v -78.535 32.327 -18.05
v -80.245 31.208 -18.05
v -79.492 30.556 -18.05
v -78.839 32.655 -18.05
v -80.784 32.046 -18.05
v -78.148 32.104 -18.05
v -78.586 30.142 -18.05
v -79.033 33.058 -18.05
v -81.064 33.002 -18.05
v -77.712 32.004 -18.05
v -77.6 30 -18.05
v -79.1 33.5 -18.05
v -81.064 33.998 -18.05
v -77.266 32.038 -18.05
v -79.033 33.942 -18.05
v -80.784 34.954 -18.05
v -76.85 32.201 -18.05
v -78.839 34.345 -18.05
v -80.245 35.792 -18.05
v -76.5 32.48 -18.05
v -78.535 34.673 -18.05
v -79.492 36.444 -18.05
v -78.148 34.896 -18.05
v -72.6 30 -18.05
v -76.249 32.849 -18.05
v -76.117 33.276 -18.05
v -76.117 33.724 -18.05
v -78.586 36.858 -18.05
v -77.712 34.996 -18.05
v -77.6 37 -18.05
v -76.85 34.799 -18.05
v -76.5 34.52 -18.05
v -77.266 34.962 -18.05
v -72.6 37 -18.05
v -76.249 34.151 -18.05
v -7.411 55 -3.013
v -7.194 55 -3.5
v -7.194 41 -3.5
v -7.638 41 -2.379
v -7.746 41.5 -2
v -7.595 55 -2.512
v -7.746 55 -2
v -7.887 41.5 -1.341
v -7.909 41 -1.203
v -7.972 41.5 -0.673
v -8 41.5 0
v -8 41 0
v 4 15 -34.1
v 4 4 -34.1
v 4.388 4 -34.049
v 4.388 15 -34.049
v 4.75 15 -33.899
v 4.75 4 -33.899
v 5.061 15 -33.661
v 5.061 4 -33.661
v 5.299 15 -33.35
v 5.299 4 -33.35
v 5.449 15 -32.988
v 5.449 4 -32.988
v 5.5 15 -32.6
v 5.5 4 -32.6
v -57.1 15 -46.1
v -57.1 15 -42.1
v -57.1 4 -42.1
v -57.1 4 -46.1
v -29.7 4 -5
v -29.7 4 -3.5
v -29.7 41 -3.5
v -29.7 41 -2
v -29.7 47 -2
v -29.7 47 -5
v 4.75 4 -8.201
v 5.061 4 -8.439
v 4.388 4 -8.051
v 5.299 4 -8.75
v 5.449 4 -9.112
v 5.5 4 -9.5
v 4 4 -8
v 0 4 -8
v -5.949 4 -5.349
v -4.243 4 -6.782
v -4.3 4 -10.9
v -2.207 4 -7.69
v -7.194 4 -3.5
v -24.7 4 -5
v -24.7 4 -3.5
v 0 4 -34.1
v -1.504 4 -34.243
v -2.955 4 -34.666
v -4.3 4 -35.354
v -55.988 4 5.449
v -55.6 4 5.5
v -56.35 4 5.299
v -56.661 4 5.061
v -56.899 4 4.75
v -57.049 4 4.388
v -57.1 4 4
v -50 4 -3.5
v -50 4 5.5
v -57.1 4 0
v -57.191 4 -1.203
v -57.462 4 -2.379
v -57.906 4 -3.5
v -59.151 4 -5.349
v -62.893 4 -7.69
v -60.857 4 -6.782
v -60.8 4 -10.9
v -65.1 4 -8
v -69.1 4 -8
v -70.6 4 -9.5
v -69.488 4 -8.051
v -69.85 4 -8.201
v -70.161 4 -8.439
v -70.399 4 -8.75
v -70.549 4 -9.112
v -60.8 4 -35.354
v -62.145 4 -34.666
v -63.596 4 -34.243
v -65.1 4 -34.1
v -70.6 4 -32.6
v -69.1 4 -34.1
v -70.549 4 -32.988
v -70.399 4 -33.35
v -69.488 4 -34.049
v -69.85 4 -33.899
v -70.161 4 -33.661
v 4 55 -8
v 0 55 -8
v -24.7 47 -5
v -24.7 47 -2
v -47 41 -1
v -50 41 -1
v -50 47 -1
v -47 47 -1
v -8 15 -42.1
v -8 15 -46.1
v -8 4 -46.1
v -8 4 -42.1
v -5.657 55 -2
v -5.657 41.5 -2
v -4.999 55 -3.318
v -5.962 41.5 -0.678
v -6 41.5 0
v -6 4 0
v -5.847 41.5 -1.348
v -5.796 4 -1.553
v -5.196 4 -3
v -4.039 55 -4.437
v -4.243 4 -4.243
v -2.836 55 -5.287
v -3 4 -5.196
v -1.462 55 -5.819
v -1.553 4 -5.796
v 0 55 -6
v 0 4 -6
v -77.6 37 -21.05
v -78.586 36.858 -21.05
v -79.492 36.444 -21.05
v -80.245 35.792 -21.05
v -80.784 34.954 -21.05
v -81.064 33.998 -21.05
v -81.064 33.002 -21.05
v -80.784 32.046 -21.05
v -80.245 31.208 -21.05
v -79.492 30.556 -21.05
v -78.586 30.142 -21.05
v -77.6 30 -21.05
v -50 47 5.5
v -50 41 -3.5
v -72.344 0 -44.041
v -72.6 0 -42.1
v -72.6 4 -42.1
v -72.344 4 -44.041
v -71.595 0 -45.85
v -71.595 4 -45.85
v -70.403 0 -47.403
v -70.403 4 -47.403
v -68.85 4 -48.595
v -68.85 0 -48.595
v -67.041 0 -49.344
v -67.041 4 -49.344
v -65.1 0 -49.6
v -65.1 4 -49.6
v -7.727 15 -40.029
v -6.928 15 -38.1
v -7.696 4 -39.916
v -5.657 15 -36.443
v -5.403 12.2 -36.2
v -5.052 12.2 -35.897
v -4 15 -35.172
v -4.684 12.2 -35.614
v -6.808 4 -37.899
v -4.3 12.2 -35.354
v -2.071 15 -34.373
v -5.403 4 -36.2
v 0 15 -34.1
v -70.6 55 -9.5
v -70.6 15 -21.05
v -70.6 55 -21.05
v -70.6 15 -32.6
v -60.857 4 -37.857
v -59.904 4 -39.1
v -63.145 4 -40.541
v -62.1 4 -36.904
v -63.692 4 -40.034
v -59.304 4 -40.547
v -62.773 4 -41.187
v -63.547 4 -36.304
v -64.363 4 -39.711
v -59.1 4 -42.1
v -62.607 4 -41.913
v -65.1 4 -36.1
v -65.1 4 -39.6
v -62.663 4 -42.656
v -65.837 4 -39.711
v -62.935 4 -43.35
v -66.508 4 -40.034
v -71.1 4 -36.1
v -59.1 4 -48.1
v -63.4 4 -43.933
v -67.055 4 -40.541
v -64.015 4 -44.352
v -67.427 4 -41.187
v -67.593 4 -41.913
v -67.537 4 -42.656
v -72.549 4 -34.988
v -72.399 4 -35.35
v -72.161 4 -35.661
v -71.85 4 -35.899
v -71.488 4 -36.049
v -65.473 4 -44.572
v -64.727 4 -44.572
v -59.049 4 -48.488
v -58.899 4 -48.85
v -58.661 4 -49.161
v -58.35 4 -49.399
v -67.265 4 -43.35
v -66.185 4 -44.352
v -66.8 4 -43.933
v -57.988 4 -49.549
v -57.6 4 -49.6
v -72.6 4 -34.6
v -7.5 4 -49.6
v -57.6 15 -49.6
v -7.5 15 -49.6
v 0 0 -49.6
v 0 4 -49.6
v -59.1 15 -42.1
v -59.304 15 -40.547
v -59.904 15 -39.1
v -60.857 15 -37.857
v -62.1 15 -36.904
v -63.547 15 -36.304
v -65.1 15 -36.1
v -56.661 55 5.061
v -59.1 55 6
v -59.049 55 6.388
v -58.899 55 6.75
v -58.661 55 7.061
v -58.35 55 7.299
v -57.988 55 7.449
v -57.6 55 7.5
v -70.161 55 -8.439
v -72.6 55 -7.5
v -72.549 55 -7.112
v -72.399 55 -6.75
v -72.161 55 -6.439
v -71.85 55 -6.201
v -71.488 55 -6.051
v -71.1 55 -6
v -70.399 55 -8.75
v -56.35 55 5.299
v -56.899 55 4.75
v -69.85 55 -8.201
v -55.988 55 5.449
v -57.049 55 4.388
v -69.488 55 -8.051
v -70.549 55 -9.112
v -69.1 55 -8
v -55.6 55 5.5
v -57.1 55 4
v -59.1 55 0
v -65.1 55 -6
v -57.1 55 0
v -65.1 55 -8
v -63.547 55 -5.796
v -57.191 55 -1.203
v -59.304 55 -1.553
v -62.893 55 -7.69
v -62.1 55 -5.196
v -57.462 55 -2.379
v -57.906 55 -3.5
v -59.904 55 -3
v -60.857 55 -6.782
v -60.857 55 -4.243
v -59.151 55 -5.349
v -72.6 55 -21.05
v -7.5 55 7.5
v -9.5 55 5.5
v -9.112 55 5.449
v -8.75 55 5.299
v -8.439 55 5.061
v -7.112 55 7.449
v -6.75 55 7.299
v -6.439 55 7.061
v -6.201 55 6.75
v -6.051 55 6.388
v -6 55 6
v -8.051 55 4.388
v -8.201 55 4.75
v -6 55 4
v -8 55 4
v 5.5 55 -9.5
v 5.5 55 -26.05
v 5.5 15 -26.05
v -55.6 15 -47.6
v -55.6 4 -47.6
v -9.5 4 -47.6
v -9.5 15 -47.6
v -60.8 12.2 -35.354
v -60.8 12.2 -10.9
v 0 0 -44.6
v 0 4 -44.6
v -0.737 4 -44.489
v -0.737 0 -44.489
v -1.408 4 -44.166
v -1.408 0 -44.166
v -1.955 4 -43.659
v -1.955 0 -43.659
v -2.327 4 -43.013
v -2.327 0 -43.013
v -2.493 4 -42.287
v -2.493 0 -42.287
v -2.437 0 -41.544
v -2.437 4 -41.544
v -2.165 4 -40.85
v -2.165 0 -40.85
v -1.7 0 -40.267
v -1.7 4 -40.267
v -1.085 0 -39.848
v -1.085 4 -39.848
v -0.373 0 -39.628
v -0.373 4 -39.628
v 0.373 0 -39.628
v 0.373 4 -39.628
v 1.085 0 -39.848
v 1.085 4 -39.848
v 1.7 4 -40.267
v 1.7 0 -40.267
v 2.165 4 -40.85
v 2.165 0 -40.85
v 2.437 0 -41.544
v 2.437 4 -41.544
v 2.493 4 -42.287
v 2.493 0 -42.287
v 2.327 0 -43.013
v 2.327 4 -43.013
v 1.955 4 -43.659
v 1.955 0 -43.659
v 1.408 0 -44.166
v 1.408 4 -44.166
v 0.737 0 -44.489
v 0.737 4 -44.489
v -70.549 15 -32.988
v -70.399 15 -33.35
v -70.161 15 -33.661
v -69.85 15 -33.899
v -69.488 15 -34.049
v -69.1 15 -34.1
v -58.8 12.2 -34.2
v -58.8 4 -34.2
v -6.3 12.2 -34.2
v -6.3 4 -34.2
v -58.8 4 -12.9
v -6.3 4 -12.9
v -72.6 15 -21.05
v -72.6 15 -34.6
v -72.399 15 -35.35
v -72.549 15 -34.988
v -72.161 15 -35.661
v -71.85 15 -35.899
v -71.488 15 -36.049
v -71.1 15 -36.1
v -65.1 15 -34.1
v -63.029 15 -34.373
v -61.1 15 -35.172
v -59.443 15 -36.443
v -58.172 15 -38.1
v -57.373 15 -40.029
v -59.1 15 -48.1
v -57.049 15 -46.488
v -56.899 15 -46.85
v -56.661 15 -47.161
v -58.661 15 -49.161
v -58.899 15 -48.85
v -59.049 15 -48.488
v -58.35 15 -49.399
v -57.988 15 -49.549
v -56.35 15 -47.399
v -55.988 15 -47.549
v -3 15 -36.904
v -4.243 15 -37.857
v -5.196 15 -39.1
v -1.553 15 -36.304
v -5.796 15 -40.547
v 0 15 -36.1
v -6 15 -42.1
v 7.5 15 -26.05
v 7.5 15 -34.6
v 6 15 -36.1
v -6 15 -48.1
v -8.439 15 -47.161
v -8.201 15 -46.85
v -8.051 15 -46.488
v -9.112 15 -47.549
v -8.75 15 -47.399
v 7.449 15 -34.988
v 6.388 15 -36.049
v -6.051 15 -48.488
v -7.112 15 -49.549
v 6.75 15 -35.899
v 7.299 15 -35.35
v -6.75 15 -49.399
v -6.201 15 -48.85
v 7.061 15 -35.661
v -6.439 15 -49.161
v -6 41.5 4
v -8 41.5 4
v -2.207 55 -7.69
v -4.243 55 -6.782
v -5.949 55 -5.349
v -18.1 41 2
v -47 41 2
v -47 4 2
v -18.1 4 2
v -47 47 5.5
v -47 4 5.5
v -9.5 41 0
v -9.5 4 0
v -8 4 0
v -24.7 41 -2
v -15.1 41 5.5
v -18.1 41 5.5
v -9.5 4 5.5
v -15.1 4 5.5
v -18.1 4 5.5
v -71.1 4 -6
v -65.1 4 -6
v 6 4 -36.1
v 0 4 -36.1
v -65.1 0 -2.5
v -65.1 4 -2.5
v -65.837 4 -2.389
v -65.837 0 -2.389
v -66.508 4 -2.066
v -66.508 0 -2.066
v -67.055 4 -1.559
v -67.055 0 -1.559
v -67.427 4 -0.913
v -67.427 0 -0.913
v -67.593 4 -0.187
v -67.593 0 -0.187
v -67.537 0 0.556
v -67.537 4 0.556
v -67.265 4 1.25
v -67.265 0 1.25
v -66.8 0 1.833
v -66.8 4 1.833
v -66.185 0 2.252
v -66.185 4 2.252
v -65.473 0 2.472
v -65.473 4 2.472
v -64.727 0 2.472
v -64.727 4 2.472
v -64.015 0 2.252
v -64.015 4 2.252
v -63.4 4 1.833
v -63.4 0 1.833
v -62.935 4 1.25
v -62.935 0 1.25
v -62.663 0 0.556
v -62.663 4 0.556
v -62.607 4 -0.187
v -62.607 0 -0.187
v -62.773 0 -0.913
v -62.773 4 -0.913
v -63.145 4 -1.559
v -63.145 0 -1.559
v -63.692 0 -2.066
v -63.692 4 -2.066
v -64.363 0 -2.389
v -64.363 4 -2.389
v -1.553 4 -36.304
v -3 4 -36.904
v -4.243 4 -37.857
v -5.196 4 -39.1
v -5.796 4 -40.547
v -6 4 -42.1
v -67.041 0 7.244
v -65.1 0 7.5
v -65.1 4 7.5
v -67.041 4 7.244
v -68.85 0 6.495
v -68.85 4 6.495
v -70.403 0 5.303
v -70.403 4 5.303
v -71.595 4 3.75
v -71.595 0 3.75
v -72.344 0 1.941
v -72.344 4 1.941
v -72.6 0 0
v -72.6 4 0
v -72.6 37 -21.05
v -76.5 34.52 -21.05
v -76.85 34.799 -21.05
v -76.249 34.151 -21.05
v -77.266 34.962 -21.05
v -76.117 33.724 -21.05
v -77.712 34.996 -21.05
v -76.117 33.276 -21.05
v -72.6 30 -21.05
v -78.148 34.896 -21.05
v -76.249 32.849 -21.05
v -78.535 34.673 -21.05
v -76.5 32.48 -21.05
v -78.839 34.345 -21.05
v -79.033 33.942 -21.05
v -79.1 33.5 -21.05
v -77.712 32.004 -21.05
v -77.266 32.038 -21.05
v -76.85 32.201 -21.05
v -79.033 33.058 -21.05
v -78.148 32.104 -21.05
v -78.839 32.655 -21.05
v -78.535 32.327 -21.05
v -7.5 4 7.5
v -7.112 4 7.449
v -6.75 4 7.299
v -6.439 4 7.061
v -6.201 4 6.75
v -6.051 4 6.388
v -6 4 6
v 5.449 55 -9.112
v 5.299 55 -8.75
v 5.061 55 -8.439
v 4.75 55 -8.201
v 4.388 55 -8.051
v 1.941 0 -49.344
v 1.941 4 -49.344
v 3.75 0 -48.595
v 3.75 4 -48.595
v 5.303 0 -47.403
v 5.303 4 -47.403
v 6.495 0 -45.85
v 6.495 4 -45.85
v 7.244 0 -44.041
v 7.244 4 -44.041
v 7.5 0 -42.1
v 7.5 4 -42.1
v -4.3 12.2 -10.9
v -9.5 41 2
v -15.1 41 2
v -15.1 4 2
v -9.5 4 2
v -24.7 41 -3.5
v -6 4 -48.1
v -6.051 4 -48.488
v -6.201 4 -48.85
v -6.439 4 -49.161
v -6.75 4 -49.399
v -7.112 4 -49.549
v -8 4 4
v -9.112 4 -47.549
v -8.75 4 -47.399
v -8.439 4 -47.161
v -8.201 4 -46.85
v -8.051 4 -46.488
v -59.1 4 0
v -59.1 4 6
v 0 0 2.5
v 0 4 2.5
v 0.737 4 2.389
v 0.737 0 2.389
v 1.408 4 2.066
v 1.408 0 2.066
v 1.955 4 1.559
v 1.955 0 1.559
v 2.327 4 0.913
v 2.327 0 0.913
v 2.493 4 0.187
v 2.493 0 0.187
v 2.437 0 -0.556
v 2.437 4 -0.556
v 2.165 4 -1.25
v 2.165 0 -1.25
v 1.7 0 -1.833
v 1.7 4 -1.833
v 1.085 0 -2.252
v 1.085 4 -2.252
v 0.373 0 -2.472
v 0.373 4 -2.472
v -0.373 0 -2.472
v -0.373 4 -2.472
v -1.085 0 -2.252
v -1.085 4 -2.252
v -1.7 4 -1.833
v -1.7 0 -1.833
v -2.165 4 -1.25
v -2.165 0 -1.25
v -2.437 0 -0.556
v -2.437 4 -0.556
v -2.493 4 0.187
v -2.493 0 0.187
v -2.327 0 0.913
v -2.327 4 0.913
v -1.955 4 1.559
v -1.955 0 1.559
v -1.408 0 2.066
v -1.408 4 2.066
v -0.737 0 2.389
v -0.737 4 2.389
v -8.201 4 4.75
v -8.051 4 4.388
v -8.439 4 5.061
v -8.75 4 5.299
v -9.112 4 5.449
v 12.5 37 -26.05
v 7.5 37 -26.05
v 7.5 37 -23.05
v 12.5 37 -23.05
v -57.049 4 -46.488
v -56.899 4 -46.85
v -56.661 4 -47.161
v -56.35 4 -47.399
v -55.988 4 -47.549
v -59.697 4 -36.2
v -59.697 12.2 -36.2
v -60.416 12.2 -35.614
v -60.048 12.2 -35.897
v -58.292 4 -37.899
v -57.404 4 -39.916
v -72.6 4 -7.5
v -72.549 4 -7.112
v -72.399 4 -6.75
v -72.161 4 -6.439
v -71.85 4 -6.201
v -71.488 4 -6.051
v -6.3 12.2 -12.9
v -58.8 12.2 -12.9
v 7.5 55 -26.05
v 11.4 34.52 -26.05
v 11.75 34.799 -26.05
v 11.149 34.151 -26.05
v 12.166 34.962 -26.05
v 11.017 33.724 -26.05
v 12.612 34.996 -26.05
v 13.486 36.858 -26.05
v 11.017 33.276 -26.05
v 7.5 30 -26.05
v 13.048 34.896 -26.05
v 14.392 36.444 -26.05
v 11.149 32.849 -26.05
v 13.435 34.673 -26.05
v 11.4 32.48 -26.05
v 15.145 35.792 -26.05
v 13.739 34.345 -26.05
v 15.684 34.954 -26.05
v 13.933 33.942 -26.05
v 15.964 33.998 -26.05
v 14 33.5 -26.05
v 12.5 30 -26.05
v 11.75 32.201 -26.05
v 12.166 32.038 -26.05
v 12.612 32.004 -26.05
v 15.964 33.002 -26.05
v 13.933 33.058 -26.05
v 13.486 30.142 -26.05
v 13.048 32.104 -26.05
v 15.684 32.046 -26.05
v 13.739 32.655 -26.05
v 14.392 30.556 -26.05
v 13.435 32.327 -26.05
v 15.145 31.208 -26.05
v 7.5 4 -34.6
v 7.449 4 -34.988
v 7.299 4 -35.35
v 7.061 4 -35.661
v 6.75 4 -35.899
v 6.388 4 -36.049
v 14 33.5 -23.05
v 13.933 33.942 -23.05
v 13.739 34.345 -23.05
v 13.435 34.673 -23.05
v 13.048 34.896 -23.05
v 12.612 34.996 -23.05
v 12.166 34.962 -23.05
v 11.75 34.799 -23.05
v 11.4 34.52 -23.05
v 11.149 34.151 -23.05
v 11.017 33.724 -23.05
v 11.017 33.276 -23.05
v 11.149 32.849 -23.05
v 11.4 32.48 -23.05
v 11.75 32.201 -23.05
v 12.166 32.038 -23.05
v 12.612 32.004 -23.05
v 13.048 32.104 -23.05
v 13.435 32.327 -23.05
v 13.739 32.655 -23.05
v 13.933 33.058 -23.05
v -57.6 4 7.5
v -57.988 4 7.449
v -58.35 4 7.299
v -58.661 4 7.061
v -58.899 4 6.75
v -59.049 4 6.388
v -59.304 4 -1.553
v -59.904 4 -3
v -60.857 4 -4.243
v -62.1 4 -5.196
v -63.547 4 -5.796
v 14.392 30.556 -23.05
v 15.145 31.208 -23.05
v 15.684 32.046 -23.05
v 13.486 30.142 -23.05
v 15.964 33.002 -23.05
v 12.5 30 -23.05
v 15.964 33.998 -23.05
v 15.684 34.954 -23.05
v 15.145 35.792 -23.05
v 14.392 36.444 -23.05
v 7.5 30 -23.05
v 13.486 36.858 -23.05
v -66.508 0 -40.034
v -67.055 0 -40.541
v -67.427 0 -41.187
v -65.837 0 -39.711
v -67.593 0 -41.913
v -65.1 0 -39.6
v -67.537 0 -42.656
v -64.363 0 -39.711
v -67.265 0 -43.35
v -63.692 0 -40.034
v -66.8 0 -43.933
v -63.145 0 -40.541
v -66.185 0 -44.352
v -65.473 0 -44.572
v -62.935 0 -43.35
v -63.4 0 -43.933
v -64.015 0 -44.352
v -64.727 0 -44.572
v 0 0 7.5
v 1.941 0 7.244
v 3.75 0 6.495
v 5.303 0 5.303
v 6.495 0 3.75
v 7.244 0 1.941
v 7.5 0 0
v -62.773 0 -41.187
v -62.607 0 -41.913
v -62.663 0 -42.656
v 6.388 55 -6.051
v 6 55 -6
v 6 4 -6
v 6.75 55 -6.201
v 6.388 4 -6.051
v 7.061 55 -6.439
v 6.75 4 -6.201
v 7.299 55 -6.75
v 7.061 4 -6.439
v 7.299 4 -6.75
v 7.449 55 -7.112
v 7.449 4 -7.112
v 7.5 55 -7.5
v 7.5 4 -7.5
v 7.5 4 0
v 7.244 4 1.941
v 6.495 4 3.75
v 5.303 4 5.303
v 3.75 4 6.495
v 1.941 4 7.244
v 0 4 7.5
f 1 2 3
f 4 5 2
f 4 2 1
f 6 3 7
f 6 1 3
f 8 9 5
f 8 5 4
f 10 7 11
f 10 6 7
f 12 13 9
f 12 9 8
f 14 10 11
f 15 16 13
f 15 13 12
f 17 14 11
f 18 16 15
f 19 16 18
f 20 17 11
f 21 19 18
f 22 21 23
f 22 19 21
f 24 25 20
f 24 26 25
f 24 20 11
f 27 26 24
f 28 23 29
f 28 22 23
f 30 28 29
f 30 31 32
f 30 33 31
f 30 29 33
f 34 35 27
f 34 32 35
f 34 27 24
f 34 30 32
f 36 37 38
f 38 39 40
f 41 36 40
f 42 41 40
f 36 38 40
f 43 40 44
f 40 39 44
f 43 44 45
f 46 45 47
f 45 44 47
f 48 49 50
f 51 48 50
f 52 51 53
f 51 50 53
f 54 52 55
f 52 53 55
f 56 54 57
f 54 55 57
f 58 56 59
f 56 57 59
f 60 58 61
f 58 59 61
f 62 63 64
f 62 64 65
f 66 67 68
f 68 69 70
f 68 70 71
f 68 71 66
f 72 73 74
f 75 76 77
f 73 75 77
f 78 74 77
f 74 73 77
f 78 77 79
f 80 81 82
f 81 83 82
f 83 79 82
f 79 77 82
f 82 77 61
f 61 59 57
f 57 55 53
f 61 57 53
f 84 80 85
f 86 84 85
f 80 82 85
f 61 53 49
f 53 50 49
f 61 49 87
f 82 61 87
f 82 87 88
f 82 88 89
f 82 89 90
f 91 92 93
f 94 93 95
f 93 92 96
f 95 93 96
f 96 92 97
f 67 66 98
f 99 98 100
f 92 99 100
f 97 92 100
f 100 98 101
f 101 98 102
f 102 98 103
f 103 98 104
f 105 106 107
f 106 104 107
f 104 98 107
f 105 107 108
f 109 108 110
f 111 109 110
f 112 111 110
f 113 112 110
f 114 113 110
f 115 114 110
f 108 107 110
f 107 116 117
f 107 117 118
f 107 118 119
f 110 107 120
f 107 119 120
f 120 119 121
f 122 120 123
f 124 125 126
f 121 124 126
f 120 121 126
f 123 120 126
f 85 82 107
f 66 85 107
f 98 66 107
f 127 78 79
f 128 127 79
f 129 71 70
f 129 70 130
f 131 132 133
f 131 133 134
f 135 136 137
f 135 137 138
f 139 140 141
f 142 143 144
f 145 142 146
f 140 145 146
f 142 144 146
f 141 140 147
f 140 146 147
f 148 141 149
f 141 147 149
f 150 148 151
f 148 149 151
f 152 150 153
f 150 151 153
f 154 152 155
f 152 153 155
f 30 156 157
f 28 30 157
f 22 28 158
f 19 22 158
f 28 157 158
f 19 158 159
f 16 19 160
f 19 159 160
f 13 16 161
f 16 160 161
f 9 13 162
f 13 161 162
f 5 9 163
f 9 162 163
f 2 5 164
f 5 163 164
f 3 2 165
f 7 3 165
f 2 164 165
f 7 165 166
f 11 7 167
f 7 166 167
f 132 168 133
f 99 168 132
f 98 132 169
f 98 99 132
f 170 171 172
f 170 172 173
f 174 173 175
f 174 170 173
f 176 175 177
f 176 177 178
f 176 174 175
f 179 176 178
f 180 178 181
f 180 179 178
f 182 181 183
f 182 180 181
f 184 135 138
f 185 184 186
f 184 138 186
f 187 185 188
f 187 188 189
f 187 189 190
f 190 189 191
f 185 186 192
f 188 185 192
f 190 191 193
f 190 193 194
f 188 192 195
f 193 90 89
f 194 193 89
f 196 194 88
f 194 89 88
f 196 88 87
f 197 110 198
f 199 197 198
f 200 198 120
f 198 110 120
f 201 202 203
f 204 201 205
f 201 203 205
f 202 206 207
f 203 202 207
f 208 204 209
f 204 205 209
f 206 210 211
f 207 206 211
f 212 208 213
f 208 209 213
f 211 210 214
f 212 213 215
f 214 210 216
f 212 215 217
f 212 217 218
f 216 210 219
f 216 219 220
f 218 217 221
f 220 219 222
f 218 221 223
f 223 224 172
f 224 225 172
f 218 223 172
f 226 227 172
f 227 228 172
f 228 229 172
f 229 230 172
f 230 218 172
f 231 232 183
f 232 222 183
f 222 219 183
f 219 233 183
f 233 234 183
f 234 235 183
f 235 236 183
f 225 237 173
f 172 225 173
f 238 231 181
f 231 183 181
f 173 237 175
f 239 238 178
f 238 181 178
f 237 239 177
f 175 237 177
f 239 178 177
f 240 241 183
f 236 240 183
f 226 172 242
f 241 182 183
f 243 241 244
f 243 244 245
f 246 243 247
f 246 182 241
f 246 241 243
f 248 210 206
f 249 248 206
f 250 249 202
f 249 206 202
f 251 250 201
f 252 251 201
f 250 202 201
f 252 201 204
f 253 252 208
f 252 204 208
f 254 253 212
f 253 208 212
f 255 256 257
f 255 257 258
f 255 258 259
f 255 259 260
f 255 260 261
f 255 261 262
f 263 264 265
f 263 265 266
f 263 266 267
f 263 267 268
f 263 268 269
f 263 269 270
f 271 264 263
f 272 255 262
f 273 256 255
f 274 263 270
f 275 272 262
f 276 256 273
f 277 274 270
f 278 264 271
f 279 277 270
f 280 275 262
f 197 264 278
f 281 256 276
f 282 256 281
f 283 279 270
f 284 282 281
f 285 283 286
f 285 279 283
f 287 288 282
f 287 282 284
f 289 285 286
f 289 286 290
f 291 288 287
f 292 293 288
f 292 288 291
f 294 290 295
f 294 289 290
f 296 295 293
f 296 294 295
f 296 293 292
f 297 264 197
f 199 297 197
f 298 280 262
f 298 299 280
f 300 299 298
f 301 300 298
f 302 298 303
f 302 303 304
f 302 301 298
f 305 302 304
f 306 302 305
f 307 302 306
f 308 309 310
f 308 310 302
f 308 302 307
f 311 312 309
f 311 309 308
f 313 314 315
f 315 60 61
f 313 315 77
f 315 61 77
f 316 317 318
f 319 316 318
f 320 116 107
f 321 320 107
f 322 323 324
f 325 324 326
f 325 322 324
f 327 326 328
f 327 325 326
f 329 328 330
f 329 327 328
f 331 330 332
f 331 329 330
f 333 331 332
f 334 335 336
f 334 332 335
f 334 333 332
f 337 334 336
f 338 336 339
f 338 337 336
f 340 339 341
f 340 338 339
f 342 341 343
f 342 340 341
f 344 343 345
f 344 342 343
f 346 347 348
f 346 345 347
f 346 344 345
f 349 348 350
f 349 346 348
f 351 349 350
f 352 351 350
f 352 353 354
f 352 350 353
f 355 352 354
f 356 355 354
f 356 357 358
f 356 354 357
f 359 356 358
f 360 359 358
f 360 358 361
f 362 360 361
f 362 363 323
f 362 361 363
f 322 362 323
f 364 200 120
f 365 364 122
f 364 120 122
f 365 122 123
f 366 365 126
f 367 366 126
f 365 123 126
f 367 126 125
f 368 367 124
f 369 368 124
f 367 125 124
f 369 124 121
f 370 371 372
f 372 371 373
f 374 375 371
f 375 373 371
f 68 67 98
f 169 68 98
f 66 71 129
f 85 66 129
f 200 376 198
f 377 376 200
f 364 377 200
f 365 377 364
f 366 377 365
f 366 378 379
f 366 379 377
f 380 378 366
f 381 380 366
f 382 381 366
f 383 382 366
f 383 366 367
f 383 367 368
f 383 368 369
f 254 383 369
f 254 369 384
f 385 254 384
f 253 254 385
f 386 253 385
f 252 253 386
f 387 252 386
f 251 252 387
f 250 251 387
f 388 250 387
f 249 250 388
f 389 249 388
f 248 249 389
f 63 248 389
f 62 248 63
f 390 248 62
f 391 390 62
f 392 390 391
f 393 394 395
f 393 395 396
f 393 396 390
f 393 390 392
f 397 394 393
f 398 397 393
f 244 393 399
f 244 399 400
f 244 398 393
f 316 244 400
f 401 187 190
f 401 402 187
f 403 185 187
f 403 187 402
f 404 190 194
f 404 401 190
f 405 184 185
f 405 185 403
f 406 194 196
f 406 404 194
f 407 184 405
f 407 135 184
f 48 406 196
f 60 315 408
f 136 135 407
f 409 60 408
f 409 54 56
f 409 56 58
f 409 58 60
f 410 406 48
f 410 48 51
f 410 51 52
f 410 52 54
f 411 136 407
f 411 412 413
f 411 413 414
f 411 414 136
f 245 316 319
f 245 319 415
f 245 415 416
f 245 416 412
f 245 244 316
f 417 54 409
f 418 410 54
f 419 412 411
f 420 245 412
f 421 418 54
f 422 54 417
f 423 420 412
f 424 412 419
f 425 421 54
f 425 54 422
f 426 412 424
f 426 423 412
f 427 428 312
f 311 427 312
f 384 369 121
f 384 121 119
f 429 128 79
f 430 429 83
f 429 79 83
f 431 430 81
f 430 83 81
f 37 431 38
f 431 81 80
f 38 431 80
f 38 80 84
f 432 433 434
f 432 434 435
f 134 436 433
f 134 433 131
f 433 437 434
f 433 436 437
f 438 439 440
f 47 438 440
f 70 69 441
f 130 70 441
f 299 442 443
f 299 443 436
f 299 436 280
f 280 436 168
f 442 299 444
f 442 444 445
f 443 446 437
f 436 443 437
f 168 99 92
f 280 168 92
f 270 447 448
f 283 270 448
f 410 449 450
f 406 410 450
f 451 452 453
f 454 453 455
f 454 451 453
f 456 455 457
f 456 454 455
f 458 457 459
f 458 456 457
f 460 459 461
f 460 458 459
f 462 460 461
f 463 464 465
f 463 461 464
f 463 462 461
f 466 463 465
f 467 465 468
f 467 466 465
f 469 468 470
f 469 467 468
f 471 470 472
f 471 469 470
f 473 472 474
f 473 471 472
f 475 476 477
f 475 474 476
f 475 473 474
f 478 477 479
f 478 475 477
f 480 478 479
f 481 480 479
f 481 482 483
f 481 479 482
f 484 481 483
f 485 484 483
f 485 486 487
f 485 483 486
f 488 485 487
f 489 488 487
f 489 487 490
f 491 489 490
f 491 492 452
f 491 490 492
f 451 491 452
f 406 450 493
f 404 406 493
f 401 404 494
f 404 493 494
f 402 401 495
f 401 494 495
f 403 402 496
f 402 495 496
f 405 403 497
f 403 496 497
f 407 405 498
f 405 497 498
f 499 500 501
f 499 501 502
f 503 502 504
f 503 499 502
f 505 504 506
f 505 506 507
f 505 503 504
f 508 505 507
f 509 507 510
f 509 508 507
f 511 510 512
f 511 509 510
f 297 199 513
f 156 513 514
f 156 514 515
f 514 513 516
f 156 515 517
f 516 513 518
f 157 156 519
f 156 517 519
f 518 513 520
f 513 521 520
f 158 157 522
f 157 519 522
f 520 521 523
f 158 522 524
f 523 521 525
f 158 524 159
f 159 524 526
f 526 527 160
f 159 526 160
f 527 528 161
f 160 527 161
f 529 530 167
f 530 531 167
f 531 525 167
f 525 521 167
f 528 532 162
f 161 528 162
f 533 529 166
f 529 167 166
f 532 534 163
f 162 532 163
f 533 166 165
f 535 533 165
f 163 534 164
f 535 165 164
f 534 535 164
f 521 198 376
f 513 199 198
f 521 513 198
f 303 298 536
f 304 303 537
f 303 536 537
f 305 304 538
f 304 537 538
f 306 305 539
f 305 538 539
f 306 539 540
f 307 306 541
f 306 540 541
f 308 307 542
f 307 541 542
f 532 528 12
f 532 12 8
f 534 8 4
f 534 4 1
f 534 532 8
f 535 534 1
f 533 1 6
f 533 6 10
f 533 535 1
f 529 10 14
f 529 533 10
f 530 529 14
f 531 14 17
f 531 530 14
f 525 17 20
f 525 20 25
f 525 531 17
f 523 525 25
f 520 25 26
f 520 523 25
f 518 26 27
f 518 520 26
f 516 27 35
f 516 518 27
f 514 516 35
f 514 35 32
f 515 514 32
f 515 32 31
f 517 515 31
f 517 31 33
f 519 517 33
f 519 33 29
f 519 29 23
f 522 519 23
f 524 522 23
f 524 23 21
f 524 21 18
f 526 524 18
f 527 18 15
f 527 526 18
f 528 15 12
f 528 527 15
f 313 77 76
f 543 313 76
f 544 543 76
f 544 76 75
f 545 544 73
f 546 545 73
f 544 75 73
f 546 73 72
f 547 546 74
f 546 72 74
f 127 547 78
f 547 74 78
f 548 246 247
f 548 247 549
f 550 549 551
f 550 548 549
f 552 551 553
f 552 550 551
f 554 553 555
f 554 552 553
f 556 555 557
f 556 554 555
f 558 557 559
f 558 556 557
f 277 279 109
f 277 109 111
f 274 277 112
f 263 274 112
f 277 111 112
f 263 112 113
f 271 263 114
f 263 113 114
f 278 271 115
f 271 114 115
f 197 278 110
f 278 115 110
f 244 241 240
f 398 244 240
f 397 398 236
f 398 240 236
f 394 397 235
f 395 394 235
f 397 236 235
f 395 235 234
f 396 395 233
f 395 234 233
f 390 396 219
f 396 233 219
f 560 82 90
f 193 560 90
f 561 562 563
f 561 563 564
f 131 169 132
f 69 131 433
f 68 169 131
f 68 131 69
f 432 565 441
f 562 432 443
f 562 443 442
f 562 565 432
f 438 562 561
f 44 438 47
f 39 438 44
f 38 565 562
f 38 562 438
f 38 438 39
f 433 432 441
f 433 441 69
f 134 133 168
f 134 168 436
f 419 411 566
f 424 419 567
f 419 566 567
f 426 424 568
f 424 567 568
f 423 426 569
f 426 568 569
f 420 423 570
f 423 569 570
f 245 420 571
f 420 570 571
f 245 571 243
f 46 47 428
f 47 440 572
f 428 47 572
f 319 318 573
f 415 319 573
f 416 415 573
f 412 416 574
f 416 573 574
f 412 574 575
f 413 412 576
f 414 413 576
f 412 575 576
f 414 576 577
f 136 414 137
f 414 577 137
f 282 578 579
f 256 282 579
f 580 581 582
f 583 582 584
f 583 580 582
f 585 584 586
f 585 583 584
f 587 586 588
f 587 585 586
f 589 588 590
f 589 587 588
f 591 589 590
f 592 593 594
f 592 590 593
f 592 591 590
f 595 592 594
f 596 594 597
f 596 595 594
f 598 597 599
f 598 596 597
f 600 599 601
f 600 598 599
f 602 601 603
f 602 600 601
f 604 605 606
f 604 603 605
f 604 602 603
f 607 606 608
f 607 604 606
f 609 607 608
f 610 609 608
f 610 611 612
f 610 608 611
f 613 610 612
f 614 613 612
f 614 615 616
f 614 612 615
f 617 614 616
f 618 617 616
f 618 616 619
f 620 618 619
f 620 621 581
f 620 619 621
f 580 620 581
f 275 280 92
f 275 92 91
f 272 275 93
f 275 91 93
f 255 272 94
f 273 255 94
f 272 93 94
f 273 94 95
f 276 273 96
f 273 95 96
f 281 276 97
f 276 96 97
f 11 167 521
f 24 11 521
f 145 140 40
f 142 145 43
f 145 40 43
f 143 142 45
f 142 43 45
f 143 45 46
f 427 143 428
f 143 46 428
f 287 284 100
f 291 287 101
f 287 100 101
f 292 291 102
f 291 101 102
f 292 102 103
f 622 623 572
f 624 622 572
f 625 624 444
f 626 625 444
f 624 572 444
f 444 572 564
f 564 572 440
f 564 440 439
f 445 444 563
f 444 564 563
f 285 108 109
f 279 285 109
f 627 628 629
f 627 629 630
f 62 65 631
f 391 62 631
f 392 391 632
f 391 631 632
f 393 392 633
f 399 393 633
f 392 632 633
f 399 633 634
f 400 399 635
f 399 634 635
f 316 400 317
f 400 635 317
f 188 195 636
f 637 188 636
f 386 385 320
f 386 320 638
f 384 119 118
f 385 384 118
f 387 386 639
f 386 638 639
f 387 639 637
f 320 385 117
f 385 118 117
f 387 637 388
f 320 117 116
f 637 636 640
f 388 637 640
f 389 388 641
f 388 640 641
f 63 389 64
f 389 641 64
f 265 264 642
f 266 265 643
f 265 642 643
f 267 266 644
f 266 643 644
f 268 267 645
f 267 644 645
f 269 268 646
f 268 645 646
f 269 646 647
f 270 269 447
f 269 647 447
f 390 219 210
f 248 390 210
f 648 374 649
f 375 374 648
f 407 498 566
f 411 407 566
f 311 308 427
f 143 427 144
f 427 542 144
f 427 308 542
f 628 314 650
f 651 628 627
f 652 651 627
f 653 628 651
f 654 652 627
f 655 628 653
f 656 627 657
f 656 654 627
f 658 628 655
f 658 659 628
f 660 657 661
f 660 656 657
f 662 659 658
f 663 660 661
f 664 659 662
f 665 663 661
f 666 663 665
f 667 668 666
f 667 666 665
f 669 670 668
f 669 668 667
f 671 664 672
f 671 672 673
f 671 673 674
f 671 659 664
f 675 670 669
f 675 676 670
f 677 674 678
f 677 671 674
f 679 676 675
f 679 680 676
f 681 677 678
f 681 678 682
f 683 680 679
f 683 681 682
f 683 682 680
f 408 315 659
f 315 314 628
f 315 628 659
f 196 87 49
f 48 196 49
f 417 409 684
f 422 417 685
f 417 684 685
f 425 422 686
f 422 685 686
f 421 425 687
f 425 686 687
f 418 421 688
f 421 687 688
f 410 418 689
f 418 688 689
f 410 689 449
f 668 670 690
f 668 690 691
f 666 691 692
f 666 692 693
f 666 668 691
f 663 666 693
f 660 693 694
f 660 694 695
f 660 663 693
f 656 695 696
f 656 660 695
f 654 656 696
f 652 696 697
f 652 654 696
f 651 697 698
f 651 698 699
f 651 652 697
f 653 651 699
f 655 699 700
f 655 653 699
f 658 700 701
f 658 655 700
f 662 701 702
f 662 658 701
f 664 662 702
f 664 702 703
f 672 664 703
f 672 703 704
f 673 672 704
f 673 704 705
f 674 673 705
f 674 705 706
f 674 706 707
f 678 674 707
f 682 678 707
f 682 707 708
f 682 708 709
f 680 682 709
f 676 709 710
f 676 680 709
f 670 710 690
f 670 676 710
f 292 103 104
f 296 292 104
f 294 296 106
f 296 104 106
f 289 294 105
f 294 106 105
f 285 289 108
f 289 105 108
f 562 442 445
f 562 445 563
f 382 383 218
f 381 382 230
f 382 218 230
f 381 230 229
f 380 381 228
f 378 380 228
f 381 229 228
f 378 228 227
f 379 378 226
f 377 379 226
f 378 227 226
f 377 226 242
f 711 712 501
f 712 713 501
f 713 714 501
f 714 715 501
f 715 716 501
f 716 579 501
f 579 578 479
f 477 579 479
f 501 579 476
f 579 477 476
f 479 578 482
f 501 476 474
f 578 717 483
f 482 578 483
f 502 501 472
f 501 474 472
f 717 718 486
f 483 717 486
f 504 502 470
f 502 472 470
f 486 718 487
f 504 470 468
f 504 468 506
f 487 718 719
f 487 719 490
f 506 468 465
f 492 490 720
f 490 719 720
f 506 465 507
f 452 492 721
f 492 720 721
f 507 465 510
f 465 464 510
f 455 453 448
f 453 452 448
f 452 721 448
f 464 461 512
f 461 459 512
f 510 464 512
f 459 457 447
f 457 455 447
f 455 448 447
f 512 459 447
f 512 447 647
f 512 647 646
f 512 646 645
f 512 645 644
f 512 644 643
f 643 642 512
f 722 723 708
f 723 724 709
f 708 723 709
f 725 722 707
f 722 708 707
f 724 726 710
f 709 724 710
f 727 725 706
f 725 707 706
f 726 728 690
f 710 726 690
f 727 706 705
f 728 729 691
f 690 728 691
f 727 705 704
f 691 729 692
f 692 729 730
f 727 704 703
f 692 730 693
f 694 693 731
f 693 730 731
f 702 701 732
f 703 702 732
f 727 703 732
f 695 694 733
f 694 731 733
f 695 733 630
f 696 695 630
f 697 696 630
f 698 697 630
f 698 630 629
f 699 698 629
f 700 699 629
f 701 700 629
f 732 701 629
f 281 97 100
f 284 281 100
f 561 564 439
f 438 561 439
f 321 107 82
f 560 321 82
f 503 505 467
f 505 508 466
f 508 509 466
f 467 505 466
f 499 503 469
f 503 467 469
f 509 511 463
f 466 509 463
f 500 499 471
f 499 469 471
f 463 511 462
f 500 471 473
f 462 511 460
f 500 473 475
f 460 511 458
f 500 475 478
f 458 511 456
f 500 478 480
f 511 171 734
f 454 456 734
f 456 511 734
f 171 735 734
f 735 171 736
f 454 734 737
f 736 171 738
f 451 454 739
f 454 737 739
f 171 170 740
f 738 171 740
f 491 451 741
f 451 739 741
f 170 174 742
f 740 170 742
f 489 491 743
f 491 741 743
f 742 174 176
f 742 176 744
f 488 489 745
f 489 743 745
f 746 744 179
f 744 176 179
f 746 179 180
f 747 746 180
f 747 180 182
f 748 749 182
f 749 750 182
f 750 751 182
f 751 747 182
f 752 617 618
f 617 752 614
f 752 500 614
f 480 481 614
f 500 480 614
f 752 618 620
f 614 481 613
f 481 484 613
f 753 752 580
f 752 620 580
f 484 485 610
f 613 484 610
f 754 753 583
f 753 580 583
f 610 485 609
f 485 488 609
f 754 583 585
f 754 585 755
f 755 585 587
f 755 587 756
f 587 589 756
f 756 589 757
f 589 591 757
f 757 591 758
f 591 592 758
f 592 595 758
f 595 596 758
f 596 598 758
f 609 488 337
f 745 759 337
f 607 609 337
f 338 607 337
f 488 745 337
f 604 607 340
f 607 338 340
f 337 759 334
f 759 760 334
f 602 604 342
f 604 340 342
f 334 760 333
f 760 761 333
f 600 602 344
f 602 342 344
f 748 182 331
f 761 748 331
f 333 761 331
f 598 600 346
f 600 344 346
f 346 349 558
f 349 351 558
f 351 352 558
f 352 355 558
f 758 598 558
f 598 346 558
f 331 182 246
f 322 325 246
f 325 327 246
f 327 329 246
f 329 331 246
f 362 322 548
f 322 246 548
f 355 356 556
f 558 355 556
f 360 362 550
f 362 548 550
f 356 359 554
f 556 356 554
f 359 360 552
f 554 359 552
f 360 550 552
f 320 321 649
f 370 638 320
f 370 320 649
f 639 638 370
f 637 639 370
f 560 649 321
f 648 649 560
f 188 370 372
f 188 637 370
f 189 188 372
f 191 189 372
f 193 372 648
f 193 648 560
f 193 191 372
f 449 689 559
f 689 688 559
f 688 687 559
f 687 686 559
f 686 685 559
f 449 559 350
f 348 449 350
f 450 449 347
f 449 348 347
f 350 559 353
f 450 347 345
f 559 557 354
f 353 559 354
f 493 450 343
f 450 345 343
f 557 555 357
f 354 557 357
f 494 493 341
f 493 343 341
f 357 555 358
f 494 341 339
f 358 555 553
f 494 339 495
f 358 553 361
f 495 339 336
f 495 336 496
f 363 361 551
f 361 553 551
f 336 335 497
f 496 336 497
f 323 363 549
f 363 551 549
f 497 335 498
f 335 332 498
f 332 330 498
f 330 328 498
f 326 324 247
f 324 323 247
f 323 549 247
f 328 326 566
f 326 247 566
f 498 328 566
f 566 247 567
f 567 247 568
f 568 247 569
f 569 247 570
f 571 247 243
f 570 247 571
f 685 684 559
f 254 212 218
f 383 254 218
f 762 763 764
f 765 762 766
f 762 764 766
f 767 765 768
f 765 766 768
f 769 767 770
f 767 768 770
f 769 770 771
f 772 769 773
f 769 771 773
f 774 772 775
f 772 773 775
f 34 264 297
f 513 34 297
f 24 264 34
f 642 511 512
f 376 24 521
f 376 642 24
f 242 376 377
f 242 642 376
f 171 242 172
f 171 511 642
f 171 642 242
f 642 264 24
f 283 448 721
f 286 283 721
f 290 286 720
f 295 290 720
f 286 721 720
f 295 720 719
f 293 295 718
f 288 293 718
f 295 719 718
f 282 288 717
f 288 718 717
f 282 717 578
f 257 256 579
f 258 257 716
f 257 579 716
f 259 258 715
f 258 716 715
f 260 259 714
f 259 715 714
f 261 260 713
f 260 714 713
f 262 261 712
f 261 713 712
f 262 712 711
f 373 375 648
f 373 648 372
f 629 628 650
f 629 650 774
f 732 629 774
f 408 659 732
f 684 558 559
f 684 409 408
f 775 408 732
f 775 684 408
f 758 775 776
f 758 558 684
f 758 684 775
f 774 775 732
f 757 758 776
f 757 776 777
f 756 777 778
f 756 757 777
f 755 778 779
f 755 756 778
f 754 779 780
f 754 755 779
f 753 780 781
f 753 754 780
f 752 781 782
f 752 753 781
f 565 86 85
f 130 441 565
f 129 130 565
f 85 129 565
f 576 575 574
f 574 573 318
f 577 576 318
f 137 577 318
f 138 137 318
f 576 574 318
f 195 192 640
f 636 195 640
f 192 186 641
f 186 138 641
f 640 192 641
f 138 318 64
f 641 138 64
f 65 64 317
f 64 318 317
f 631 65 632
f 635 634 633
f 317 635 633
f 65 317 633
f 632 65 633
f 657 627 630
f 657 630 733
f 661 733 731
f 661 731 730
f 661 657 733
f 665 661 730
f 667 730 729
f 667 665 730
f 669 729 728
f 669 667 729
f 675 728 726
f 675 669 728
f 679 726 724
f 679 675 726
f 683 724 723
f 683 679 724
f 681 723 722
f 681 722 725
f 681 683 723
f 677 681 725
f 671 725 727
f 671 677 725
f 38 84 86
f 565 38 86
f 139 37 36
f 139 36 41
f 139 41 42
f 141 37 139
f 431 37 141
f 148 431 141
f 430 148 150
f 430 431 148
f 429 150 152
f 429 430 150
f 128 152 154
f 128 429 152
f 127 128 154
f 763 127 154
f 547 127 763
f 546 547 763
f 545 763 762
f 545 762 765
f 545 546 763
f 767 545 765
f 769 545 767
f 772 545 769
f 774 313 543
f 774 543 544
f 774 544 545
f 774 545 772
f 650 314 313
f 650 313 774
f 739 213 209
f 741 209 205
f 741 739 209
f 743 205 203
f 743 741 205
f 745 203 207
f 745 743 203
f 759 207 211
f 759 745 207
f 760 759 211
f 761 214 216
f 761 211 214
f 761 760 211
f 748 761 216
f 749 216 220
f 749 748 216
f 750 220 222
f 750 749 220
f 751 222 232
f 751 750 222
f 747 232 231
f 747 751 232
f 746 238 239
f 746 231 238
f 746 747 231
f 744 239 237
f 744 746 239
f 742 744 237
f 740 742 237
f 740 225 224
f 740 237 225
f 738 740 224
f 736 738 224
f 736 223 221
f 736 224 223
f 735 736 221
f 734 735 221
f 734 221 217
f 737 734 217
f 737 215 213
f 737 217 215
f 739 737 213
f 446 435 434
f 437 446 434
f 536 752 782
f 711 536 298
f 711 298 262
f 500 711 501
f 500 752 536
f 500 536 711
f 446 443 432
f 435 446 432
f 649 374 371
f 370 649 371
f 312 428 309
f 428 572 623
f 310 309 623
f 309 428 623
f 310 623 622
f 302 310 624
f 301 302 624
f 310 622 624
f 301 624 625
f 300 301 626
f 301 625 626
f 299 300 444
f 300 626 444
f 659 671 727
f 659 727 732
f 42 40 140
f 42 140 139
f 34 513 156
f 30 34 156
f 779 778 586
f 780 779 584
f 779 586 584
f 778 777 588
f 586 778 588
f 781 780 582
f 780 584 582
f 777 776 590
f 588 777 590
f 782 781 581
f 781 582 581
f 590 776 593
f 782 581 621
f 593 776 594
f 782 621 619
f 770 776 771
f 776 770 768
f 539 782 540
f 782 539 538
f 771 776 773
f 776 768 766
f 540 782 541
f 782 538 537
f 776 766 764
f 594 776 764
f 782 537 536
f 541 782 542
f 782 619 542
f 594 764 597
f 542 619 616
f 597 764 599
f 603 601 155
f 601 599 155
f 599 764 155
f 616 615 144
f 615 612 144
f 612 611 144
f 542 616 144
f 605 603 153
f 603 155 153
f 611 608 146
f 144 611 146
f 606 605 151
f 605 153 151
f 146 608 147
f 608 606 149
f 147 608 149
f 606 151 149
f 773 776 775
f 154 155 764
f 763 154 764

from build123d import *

# Parameters (mm, degrees)
EXTRUDE_1_DEPTH     = 4
SKETCH_1_3_R        = 2.5
CUT_EXTRUDE_1_DEPTH = 5
SKETCH_1_4_W        = 52.5
SKETCH_1_4_H        = 21.3
EXTRUDE_2_DEPTH     = 12.2
EXTRUDE_5_DEPTH     = 15
SKETCH_1_8_W        = 2
SKETCH_1_8_H        = 5
EXTRUDE_7_DEPTH     = 55
EXTRUDE_8_DEPTH     = 41
CUT_EXTRUDE_START   = -51.1
SKETCH_4_W          = 6
SKETCH_4_H          = 13.5
CUT_EXTRUDE_2_DEPTH = 2.5
SKETCH_7_W          = 37.5
SKETCH_7_H          = 3.5
CUT_EXTRUDE_3_DEPTH = 37
SKETCH_1_12_W       = 3
SKETCH_1_12_H       = 6.5
EXTRUDE_10_DEPTH    = 41
SKETCH_7_4_W        = 5
SKETCH_7_4_H        = 1.5
EXTRUDE_12_DEPTH    = 6
SKETCH_1_13_W       = 3
SKETCH_1_13_H       = 6.5
EXTRUDE_13_DEPTH    = 47
EXTRUDE_START       = 6
SKETCH_7_5_W        = 5
SKETCH_7_5_H        = 1.5
EXTRUDE_14_DEPTH    = 43
EXTRUDE_START_2     = -28.55
SKETCH_8_R          = 1.5
EXTRUDE_15_DEPTH    = 3
EXTRUDE_START_3     = -33.55
SKETCH_8_3_R        = 1.5
EXTRUDE_16_DEPTH    = 3


with BuildPart() as part:
    # Эскиз1 → Бобышка-Вытянуть1 (new body)
    with BuildSketch(Plane(origin=(0, 0, 0), x_dir=(1, 0, 0), z_dir=(0, 1, 0))):
        with BuildLine():
            Line((-65.1, 49.6), (0, 49.6))
            ThreePointArc((0, 49.6), (5.303300859, 47.403300859), (7.5, 42.1))
            Line((7.5, 42.1), (7.5, 0))
            ThreePointArc((7.5, 0), (5.303300859, -5.303300859), (0, -7.5))
            Line((0, -7.5), (-65.1, -7.5))
            ThreePointArc((-65.1, -7.5), (-70.403300859, -5.303300859), (-72.6, 0))
            Line((-72.6, 0), (-72.6, 42.1))
            ThreePointArc((-72.6, 42.1), (-70.403300859, 47.403300859), (-65.1, 49.6))
        make_face()
    extrude(amount=EXTRUDE_1_DEPTH)

    # Эскиз1<3> → Вырез-Вытянуть1 (cut)
    with BuildSketch(Plane(origin=(0, 0, 0), x_dir=(1, 0, 0), z_dir=(0, 1, 0))):
        with Locations(Location((-65.1, 42.1, 0), (0, 0, 270))):
            Circle(SKETCH_1_3_R)
        with Locations(Location((0, 42.1, 0), (0, 0, 90))):
            Circle(SKETCH_1_3_R)
        with Locations(Location((0, 0, 0), (0, 0, 270))):
            Circle(SKETCH_1_3_R)
        with Locations(Location((-65.1, 0, 0), (0, 0, 90))):
            Circle(SKETCH_1_3_R)
    extrude(amount=CUT_EXTRUDE_1_DEPTH, mode=Mode.SUBTRACT)

    # Эскиз1<4> → Бобышка-Вытянуть2 (add)
    with BuildSketch(Plane(origin=(0, 0, 0), x_dir=(1, 0, 0), z_dir=(0, 1, 0))):
        with BuildLine():
            ThreePointArc((-59.697222936, 36.2), (-60.230200598, 35.752949206), (-60.8, 35.35389001))
            Line((-60.8, 35.35389001), (-60.8, 10.9))
            Line((-60.8, 10.9), (-4.3, 10.9))
            Line((-4.3, 10.9), (-4.3, 35.35389001))
            ThreePointArc((-4.3, 35.35389001), (-4.869799402, 35.752949206), (-5.402777064, 36.2))
            Line((-5.402777064, 36.2), (-59.697222936, 36.2))
        make_face()
        with Locations((-32.55, 23.55)):
            Rectangle(SKETCH_1_4_W, SKETCH_1_4_H, mode=Mode.SUBTRACT)
    extrude(amount=EXTRUDE_2_DEPTH)

    # Эскиз1<7> → Бобышка-Вытянуть5 (add)
    with BuildSketch(Plane(origin=(0, 0, 0), x_dir=(1, 0, 0), z_dir=(0, 1, 0))):
        with BuildLine():
            Line((-7.5, 49.6), (-57.6, 49.6))
            ThreePointArc((-57.6, 49.6), (-58.660660172, 49.160660172), (-59.1, 48.1))
            Line((-59.1, 48.1), (-59.1, 42.1))
            ThreePointArc((-59.1, 42.1), (-60.857359313, 37.857359313), (-65.1, 36.1))
            Line((-65.1, 36.1), (-71.1, 36.1))
            ThreePointArc((-71.1, 36.1), (-72.160660172, 35.660660172), (-72.6, 34.6))
            Line((-72.6, 34.6), (-72.6, 7.5))
            ThreePointArc((-72.6, 7.5), (-72.160660172, 6.439339828), (-71.1, 6))
            Line((-71.1, 6), (-65.1, 6))
            ThreePointArc((-65.1, 6), (-60.857359313, 4.242640687), (-59.1, 0))
            Line((-59.1, 0), (-59.1, -6))
            ThreePointArc((-59.1, -6), (-58.660660172, -7.060660172), (-57.6, -7.5))
            Line((-57.6, -7.5), (-7.5, -7.5))
            ThreePointArc((-7.5, -7.5), (-6.439339828, -7.060660172), (-6, -6))
            Line((-6, -6), (-6, 0))
            ThreePointArc((-6, 0), (-4.242640687, 4.242640687), (0, 6))
            Line((0, 6), (6, 6))
            ThreePointArc((6, 6), (7.060660172, 6.439339828), (7.5, 7.5))
            Line((7.5, 7.5), (7.5, 21.05))
            Line((7.5, 21.05), (5.5, 21.05))
            Line((5.5, 21.05), (5.5, 9.5))
            ThreePointArc((5.5, 9.5), (5.060660172, 8.439339828), (4, 8))
            Line((4, 8), (0, 8))
            ThreePointArc((0, 8), (-5.656854249, 5.656854249), (-8, 0))
            Line((-8, 0), (-8, -4))
            ThreePointArc((-8, -4), (-8.439339828, -5.060660172), (-9.5, -5.5))
            Line((-9.5, -5.5), (-55.6, -5.5))
            ThreePointArc((-55.6, -5.5), (-56.660660172, -5.060660172), (-57.1, -4))
            Line((-57.1, -4), (-57.1, 0))
            ThreePointArc((-57.1, 0), (-59.443145751, 5.656854249), (-65.1, 8))
            Line((-65.1, 8), (-69.1, 8))
            ThreePointArc((-69.1, 8), (-70.160660172, 8.439339828), (-70.6, 9.5))
            Line((-70.6, 9.5), (-70.6, 32.6))
            ThreePointArc((-70.6, 32.6), (-70.160660172, 33.660660172), (-69.1, 34.1))
            Line((-69.1, 34.1), (-65.1, 34.1))
            ThreePointArc((-65.1, 34.1), (-59.443145751, 36.443145751), (-57.1, 42.1))
            Line((-57.1, 42.1), (-57.1, 46.1))
            ThreePointArc((-57.1, 46.1), (-56.660660172, 47.160660172), (-55.6, 47.6))
            Line((-55.6, 47.6), (-9.5, 47.6))
            ThreePointArc((-9.5, 47.6), (-8.439339828, 47.160660172), (-8, 46.1))
            Line((-8, 46.1), (-8, 42.1))
            ThreePointArc((-8, 42.1), (-5.656854249, 36.443145751), (0, 34.1))
            Line((0, 34.1), (4, 34.1))
            ThreePointArc((4, 34.1), (5.060660172, 33.660660172), (5.5, 32.6))
            Line((5.5, 32.6), (5.5, 26.05))
            Line((5.5, 26.05), (7.5, 26.05))
            Line((7.5, 26.05), (7.5, 34.6))
            ThreePointArc((7.5, 34.6), (7.060660172, 35.660660172), (6, 36.1))
            Line((6, 36.1), (0, 36.1))
            ThreePointArc((0, 36.1), (-4.242640687, 37.857359313), (-6, 42.1))
            Line((-6, 42.1), (-6, 48.1))
            ThreePointArc((-6, 48.1), (-6.439339828, 49.160660172), (-7.5, 49.6))
        make_face()
    extrude(amount=EXTRUDE_5_DEPTH)

    # Эскиз1<8> → Бобышка-Вытянуть7 (add)
    with BuildSketch(Plane(origin=(0, 0, 0), x_dir=(1, 0, 0), z_dir=(0, 1, 0))):
        with BuildLine():
            Line((-70.6, 21.05), (-72.6, 21.05))
            Line((-72.6, 21.05), (-72.6, 7.5))
            ThreePointArc((-72.6, 7.5), (-72.160660172, 6.439339828), (-71.1, 6))
            Line((-71.1, 6), (-65.1, 6))
            ThreePointArc((-65.1, 6), (-60.857359313, 4.242640687), (-59.1, 0))
            Line((-59.1, 0), (-59.1, -6))
            ThreePointArc((-59.1, -6), (-58.660660172, -7.060660172), (-57.6, -7.5))
            Line((-57.6, -7.5), (-7.5, -7.5))
            ThreePointArc((-7.5, -7.5), (-6.439339828, -7.060660172), (-6, -6))
            Line((-6, -6), (-6, 0))
            ThreePointArc((-6, 0), (-4.242640687, 4.242640687), (0, 6))
            Line((0, 6), (6, 6))
            ThreePointArc((6, 6), (7.060660172, 6.439339828), (7.5, 7.5))
            Line((7.5, 7.5), (7.5, 21.05))
            Line((7.5, 21.05), (5.5, 21.05))
            Line((5.5, 21.05), (5.5, 9.5))
            ThreePointArc((5.5, 9.5), (5.060660172, 8.439339828), (4, 8))
            Line((4, 8), (0, 8))
            ThreePointArc((0, 8), (-4.242640687, 6.782329983), (-7.193747285, 3.5))
            ThreePointArc((-7.193747285, 3.5), (-7.795831523, 1.795831523), (-8, 0))
            Line((-8, 0), (-8, -4))
            ThreePointArc((-8, -4), (-8.439339828, -5.060660172), (-9.5, -5.5))
            Line((-9.5, -5.5), (-15.1, -5.5))
            Line((-15.1, -5.5), (-18.1, -5.5))
            Line((-18.1, -5.5), (-47, -5.5))
            Line((-47, -5.5), (-50, -5.5))
            Line((-50, -5.5), (-55.6, -5.5))
            ThreePointArc((-55.6, -5.5), (-56.660660172, -5.060660172), (-57.1, -4))
            Line((-57.1, -4), (-57.1, 0))
            ThreePointArc((-57.1, 0), (-57.304168477, 1.795831523), (-57.906252715, 3.5))
            ThreePointArc((-57.906252715, 3.5), (-60.857359313, 6.782329983), (-65.1, 8))
            Line((-65.1, 8), (-69.1, 8))
            ThreePointArc((-69.1, 8), (-70.160660172, 8.439339828), (-70.6, 9.5))
            Line((-70.6, 9.5), (-70.6, 21.05))
        make_face()
        with Locations((6.5, 23.55)):
            Rectangle(SKETCH_1_8_W, SKETCH_1_8_H)
    extrude(amount=EXTRUDE_7_DEPTH)

    # Эскиз1<9> → Бобышка-Вытянуть8 (add)
    with BuildSketch(Plane(origin=(0, 0, 0), x_dir=(1, 0, 0), z_dir=(0, 1, 0))):
        with BuildLine():
            Line((-50, 3.5), (-50, 1))
            Line((-50, 1), (-47, 1))
            Line((-47, 1), (-47, -5.5))
            Line((-47, -5.5), (-18.1, -5.5))
            Line((-18.1, -5.5), (-18.1, 1))
            Line((-18.1, 1), (-15.1, 1))
            Line((-15.1, 1), (-15.1, -5.5))
            Line((-15.1, -5.5), (-9.5, -5.5))
            Line((-9.5, -5.5), (-9.5, 0))
            Line((-9.5, 0), (-8, 0))
            ThreePointArc((-8, 0), (-7.795831523, 1.795831523), (-7.193747285, 3.5))
            Line((-7.193747285, 3.5), (-50, 3.5))
        make_face()
    extrude(amount=EXTRUDE_8_DEPTH)

    # Эскиз4 → Вырез-Вытянуть2 (cut, symmetric)
    with BuildSketch(Plane.ZY.offset(59.1).offset(CUT_EXTRUDE_START)):
        with Locations((1, 48.25)):
            Rectangle(SKETCH_4_W, SKETCH_4_H)
    extrude(amount=CUT_EXTRUDE_2_DEPTH, both=True, mode=Mode.SUBTRACT)

    # Эскиз7 → Вырез-Вытянуть3 (cut)
    with BuildSketch(Plane(origin=(0, 41, 0), x_dir=(1, 0, 0), z_dir=(0, 1, 0))):
        with Locations((-28.25, -3.75)):
            Rectangle(SKETCH_7_W, SKETCH_7_H)
    extrude(amount=-CUT_EXTRUDE_3_DEPTH, mode=Mode.SUBTRACT)

    # Эскиз1<12> → Бобышка-Вытянуть10 (add)
    with BuildSketch(Plane(origin=(0, 0, 0), x_dir=(1, 0, 0), z_dir=(0, 1, 0))):
        with Locations((-16.6, -2.25)):
            Rectangle(SKETCH_1_12_W, SKETCH_1_12_H)
    extrude(amount=EXTRUDE_10_DEPTH)

    # Эскиз7<4> → Бобышка-Вытянуть12 (add)
    with BuildSketch(Plane(origin=(0, 41, 0), x_dir=(1, 0, 0), z_dir=(0, 1, 0))):
        with Locations((-27.2, 2.75)):
            Rectangle(SKETCH_7_4_W, SKETCH_7_4_H)
    extrude(amount=EXTRUDE_12_DEPTH)

    # Эскиз1<13> → Бобышка-Вытянуть13 (add)
    with BuildSketch(Plane(origin=(0, 0, 0), x_dir=(1, 0, 0), z_dir=(0, 1, 0))):
        with Locations((-48.5, -2.25)):
            Rectangle(SKETCH_1_13_W, SKETCH_1_13_H)
    extrude(amount=EXTRUDE_13_DEPTH)

    # Эскиз7<5> → Бобышка-Вытянуть14 (add)
    with BuildSketch(Plane(origin=(0, 41, 0), x_dir=(1, 0, 0), z_dir=(0, 1, 0)).offset(EXTRUDE_START)):
        with Locations((-27.2, 4.25)):
            Rectangle(SKETCH_7_5_W, SKETCH_7_5_H)
    extrude(amount=-EXTRUDE_14_DEPTH)

    # Эскиз8 → Бобышка-Вытянуть15 (add)
    with BuildSketch(Plane.XY.offset(7.5).offset(EXTRUDE_START_2)):
        with BuildLine():
            Line((-72.6, 37), (-77.6, 37))
            ThreePointArc((-77.6, 37), (-81.1, 33.5), (-77.6, 30))
            Line((-77.6, 30), (-72.6, 30))
            Line((-72.6, 30), (-72.6, 37))
        make_face()
        with Locations(Location((-77.6, 33.5, 0), (0, 0, 180))):
            Circle(SKETCH_8_R, mode=Mode.SUBTRACT)
    extrude(amount=EXTRUDE_15_DEPTH)

    # Эскиз8<3> → Бобышка-Вытянуть16 (add)
    with BuildSketch(Plane.XY.offset(7.5).offset(EXTRUDE_START_3)):
        with BuildLine():
            ThreePointArc((12.5, 37), (16, 33.5), (12.5, 30))
            Line((12.5, 30), (7.5, 30))
            Line((7.5, 30), (7.5, 37))
            Line((7.5, 37), (12.5, 37))
        make_face()
        with Locations((12.5, 33.5)):
            Circle(SKETCH_8_3_R, mode=Mode.SUBTRACT)
    extrude(amount=EXTRUDE_16_DEPTH)


solid = part.part
